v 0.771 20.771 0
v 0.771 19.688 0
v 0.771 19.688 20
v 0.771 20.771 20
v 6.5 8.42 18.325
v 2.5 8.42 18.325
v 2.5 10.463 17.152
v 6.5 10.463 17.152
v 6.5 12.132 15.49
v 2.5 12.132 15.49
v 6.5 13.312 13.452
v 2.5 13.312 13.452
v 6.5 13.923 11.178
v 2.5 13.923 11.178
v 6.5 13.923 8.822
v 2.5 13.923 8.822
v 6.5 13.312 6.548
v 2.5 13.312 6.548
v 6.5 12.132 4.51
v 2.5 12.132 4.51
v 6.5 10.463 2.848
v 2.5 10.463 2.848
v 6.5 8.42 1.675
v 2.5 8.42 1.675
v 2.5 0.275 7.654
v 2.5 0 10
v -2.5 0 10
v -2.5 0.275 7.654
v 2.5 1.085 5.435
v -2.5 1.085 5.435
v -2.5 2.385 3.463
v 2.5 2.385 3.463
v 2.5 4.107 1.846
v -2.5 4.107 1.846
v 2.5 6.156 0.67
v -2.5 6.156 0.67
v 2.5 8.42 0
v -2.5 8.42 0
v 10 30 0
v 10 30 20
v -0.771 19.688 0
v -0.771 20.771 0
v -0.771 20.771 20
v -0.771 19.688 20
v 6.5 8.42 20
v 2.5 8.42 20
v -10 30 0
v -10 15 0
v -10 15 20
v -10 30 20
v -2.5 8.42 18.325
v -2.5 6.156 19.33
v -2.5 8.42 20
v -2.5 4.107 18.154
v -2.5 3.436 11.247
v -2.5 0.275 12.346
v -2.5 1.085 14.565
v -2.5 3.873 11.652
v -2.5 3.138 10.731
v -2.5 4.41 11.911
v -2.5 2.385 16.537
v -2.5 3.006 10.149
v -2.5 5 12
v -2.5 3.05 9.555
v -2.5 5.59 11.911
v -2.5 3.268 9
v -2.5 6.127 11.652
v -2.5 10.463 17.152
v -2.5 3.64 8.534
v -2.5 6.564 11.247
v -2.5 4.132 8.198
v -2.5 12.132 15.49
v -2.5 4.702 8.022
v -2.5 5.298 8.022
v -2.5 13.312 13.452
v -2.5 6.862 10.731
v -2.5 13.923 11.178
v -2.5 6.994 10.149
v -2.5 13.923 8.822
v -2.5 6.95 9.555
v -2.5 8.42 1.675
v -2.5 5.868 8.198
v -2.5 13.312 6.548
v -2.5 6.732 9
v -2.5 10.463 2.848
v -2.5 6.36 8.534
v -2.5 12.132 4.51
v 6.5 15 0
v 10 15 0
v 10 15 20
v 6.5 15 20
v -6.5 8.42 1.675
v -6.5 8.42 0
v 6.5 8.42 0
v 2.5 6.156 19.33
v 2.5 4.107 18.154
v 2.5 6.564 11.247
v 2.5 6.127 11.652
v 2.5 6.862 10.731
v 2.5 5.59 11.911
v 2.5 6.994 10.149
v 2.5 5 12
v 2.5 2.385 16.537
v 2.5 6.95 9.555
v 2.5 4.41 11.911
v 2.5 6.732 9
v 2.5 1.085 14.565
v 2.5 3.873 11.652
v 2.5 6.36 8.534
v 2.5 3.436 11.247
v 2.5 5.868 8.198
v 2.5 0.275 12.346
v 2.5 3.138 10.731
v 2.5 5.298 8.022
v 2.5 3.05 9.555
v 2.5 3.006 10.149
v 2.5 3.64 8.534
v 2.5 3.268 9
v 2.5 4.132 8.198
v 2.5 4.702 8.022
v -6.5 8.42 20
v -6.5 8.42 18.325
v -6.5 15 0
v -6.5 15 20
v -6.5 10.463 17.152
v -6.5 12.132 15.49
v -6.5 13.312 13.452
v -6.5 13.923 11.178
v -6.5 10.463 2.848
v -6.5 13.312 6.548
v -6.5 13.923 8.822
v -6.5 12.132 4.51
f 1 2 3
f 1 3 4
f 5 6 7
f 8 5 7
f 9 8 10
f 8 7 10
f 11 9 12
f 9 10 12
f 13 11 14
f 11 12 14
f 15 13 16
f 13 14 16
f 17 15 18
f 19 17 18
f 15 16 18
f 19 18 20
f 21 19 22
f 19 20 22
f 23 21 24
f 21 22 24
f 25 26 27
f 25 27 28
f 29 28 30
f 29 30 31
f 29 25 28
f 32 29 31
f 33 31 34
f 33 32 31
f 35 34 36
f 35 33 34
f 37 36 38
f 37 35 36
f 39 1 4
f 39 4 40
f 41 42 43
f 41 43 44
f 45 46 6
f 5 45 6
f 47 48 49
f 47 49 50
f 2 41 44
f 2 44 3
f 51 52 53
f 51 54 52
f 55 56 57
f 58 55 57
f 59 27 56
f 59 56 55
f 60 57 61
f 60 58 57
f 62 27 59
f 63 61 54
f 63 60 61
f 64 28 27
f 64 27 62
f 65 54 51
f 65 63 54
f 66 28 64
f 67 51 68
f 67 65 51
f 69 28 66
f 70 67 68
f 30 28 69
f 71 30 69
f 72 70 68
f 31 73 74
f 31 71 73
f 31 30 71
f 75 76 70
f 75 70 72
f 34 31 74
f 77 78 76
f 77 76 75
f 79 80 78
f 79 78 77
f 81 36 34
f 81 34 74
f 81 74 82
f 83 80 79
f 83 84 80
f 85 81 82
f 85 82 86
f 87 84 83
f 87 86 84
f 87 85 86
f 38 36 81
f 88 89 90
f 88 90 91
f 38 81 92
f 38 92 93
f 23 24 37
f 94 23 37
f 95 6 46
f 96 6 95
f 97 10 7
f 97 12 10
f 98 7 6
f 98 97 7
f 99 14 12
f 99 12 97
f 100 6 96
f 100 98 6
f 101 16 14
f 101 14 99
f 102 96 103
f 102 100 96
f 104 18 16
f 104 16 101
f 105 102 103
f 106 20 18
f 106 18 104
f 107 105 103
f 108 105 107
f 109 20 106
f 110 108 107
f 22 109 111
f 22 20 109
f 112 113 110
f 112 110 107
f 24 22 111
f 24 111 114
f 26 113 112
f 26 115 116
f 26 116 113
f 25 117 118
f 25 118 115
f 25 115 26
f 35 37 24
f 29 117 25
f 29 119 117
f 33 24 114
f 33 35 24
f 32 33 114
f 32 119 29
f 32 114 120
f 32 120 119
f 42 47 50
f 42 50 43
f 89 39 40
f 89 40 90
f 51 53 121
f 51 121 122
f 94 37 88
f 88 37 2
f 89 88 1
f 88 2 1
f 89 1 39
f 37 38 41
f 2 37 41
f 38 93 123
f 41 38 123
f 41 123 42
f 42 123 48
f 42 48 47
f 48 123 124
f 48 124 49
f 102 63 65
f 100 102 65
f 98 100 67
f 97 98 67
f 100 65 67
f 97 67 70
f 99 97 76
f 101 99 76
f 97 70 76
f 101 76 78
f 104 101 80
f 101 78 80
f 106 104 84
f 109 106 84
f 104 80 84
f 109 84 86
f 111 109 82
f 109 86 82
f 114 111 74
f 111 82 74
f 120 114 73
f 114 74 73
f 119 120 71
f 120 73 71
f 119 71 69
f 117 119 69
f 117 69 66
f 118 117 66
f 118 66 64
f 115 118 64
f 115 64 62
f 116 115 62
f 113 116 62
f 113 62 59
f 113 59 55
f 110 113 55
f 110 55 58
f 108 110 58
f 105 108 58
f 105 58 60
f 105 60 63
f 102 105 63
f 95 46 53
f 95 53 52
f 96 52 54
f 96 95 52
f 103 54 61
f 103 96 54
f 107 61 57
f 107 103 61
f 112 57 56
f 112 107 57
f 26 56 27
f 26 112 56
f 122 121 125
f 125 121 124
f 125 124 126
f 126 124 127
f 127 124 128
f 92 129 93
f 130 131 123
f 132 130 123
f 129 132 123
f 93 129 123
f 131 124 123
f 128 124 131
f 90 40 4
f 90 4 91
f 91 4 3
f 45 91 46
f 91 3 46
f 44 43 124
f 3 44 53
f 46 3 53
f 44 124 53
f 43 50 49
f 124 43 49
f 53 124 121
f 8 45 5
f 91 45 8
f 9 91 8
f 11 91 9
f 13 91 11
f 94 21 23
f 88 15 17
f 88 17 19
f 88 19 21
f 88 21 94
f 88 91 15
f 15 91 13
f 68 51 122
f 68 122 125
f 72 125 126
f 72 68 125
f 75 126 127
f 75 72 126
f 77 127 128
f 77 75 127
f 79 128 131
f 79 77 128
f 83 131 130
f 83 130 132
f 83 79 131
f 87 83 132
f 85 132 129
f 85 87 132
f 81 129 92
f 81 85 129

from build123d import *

# Parameters (mm, degrees)
SALIENTE_EXTRUIR1_DEPTH = 20
CROQUIS2_R              = 2
CORTAR_EXTRUIR1_DEPTH   = 39.160843806
SALIENTE_EXTRUIR3_DEPTH = 4
CORTAR_EXTRUIR3_DEPTH   = 39.160843806


with BuildPart() as part:
    # Croquis1 → Saliente-Extruir1 (new body)
    with BuildSketch(Plane.XY):
        Polygon((2.5, 0), (-2.5, 0), (-2.5, 15), (-10, 15), (-10, 30), (-0.771012727, 20.771012727), (-0.771012727, 19.688176129), (0.771012727, 19.688176129), (0.771012727, 20.771012727), (10, 30), (10, 15), (2.5, 15), align=None)
    extrude(amount=SALIENTE_EXTRUIR1_DEPTH)

    # Croquis2 → Cortar-Extruir1 (cut, through all)
    with BuildSketch(Plane.ZY.offset(2.5)):
        with Locations((10, 5)):
            Circle(CROQUIS2_R)
    extrude(amount=-CORTAR_EXTRUIR1_DEPTH, mode=Mode.SUBTRACT)

    # Croquis3 → Saliente-Extruir3 (add)
    with BuildSketch(Plane.ZY.offset(2.5)):
        with BuildLine():
            Line((0, 8.420482436), (0, 15))
            Line((0, 15), (20, 15))
            Line((20, 15), (20, 8.420482436))
            Line((20, 8.420482436), (18.324680168, 8.420482436))
            ThreePointArc((18.324680168, 8.420482436), (10, 14), (1.675319832, 8.420482436))
            Line((1.675319832, 8.420482436), (0, 8.420482436))
        make_face()
    saliente_extruir3 = extrude(amount=SALIENTE_EXTRUIR3_DEPTH)

    # Simetría2: Saliente-Extruir3 across plane
    add(saliente_extruir3.mirror(Plane.ZY))

    # Croquis5 → Cortar-Extruir3 (cut, through all)
    with BuildSketch(Plane.ZY.offset(2.5)):
        with BuildLine():
            ThreePointArc((9.999999976, 0), (3.46347713, 2.385496773), (0, 8.420482436))
            Line((0, 8.420482436), (0, 0))
            Line((0, 0), (9.999999976, 0))
        make_face()
        with BuildLine():
            ThreePointArc((20, 8.420482436), (16.536522852, 2.385496758), (9.999999976, 0))
            Line((9.999999976, 0), (20, 0))
            Line((20, 0), (20, 8.420482436))
        make_face()
    extrude(amount=-CORTAR_EXTRUIR3_DEPTH, mode=Mode.SUBTRACT)


solid = part.part
